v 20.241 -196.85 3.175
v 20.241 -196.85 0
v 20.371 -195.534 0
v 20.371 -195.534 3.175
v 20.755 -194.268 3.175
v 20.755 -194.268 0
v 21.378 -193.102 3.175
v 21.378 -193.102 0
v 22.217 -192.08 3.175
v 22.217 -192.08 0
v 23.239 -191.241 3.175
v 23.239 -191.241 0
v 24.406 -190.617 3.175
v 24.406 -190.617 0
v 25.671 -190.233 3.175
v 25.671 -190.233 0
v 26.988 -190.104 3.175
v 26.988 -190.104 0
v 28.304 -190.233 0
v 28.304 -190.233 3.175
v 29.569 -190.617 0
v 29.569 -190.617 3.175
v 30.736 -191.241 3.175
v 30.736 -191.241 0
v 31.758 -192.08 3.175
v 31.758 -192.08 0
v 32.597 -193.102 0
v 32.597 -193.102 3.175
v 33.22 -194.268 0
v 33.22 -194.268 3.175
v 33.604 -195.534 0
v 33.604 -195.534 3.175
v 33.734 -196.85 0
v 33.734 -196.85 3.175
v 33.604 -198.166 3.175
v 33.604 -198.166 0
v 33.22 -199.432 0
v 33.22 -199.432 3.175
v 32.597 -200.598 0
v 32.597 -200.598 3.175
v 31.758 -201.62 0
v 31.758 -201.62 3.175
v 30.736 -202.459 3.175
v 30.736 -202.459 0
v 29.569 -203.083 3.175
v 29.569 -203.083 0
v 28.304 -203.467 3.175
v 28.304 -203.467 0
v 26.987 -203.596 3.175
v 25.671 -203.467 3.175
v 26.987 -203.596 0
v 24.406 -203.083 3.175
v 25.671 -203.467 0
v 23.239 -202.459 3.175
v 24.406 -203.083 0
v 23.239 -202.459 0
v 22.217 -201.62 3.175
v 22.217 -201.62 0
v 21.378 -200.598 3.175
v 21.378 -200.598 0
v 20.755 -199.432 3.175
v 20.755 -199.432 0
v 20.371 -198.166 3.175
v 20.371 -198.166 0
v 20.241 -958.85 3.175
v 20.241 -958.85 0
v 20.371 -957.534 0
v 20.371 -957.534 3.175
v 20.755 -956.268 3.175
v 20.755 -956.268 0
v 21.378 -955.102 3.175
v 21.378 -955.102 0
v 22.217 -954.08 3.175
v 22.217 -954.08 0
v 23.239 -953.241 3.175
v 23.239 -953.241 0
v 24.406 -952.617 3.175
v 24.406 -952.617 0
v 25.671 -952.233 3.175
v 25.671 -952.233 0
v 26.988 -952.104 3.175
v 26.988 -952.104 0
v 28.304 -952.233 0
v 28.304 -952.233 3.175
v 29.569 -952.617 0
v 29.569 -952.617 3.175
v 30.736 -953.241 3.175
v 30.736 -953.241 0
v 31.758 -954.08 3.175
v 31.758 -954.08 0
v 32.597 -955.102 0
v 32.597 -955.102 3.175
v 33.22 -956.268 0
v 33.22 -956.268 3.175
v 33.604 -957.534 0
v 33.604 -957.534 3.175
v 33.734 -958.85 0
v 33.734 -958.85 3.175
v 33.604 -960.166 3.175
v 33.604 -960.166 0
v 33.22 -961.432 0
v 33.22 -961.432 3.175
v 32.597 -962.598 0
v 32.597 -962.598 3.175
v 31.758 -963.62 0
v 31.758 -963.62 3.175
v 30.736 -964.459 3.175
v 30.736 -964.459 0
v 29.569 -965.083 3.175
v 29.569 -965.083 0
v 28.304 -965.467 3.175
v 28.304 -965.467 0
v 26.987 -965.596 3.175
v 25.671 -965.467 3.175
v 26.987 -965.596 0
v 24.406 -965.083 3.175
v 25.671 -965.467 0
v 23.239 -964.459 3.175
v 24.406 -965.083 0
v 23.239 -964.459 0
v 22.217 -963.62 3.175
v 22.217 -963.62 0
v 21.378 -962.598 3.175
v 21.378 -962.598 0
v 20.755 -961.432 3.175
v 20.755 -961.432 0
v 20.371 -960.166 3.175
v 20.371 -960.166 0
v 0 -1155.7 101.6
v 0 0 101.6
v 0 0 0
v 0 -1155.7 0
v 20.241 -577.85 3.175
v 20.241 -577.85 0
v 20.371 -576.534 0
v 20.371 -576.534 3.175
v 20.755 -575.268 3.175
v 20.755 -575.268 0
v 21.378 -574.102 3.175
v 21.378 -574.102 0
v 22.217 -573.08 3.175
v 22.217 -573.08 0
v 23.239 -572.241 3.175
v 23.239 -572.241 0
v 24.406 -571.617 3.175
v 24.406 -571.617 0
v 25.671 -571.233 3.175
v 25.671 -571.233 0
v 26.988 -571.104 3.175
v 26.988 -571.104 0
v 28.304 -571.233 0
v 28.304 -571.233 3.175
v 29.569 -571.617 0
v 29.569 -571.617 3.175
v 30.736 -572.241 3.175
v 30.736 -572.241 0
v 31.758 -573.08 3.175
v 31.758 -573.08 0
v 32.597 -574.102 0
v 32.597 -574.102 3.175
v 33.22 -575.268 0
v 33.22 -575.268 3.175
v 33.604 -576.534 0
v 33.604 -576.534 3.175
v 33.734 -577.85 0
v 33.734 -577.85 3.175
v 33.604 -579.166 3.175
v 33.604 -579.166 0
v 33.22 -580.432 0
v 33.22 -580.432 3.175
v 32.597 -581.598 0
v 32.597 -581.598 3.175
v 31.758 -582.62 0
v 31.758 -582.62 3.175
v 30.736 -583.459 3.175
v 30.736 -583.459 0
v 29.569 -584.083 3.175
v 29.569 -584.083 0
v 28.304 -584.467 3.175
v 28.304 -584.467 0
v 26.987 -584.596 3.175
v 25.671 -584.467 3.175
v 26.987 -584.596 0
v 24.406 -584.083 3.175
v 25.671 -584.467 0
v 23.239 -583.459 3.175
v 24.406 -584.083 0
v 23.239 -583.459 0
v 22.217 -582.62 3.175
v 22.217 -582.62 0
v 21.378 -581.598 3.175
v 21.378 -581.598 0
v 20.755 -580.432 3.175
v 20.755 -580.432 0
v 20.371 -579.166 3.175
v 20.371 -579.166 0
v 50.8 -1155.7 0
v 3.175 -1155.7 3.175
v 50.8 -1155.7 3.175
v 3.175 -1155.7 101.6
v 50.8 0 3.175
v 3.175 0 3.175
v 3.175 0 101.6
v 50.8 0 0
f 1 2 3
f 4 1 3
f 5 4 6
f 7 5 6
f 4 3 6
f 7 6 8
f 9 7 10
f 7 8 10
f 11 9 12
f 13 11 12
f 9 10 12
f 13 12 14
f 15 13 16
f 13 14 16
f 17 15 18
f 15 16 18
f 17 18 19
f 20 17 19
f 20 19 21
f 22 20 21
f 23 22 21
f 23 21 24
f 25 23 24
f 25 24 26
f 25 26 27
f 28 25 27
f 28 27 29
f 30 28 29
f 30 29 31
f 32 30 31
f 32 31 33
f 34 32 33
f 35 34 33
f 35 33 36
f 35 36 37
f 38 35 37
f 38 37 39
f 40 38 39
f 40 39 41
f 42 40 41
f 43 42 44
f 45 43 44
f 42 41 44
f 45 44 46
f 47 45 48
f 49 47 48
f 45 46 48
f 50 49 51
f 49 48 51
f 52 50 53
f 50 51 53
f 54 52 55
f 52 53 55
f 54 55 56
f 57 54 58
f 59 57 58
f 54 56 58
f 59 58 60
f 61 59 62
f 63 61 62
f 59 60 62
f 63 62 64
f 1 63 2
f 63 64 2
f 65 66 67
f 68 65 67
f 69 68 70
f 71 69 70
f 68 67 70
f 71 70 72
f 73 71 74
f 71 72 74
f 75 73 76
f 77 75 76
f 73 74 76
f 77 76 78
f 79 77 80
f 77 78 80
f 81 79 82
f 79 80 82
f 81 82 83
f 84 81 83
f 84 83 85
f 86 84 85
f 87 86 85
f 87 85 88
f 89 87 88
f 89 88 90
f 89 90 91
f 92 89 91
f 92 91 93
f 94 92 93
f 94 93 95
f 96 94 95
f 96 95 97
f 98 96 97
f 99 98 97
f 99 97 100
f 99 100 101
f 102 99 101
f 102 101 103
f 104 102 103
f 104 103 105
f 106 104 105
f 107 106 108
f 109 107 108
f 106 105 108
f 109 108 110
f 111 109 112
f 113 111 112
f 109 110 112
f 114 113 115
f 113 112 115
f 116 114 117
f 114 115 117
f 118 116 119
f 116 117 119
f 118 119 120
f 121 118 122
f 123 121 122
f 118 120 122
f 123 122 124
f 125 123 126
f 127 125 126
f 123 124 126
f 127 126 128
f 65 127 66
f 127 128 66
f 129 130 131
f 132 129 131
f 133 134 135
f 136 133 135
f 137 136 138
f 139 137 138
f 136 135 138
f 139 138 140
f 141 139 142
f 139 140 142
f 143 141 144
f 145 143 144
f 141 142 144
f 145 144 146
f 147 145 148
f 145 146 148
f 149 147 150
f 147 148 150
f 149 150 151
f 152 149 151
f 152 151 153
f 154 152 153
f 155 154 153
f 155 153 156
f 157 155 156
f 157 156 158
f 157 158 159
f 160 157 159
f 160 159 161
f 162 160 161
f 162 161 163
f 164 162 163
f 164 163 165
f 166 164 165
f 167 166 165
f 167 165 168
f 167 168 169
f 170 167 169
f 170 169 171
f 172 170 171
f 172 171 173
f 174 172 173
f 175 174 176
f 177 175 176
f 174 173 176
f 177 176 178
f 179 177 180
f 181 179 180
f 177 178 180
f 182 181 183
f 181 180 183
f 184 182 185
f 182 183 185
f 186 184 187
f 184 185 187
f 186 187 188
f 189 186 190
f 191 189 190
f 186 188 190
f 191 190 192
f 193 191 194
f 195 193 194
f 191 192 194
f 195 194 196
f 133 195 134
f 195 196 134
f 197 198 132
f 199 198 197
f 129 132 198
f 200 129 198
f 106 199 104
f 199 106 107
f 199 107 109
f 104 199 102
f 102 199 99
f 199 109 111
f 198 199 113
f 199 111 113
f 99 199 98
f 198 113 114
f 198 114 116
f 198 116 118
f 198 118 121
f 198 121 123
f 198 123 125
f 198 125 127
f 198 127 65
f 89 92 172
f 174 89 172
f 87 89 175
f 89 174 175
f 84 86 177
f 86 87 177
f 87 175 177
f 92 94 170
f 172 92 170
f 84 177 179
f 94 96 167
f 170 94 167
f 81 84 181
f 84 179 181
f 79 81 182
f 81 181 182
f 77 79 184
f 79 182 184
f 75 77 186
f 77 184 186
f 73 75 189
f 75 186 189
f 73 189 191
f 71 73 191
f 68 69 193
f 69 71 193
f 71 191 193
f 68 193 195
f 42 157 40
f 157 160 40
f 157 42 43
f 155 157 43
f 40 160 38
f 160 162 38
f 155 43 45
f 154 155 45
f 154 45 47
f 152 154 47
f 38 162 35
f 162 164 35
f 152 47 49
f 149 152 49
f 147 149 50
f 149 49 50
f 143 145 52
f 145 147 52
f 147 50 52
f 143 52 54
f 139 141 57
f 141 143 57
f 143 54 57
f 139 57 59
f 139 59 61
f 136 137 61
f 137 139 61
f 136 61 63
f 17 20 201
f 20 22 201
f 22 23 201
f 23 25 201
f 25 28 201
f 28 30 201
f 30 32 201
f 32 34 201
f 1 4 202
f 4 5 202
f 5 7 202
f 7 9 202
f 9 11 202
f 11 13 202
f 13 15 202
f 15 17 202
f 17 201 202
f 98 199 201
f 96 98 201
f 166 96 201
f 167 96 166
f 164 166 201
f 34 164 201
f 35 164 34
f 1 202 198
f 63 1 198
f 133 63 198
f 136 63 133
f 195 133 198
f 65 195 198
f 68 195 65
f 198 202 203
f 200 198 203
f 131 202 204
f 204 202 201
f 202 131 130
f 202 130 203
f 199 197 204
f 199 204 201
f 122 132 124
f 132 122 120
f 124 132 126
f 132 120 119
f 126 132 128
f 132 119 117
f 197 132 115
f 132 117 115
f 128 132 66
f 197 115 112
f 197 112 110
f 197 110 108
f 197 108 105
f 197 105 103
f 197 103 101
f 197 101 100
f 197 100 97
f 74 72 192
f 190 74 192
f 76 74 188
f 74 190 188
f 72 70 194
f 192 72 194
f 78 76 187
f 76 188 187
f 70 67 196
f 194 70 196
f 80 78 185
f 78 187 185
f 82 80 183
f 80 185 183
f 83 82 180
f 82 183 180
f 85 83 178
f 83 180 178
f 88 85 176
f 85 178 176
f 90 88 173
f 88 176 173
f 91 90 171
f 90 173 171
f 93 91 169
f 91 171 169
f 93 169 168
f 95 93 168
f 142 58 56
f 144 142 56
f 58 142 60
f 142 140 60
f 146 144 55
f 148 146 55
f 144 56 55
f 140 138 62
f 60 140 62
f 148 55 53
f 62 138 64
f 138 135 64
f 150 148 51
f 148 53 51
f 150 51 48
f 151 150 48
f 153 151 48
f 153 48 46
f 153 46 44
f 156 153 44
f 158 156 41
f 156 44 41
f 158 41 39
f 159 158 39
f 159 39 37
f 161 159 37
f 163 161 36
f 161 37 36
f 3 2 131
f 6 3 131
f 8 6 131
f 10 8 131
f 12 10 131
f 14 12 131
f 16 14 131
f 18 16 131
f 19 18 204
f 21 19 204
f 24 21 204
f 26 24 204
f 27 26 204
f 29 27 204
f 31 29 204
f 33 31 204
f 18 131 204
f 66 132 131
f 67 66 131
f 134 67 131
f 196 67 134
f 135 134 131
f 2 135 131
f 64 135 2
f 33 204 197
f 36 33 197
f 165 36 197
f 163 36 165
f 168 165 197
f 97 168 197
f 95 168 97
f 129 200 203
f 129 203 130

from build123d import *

# Parameters (mm, degrees)
F1_DEPTH = 1155.7
F3_D     = 13.49248


with BuildPart() as f1:
    # F0 (on Front) → F1 (new body)
    with BuildSketch(Plane.XZ):
        Polygon((0, 101.6), (0, 0), (50.8, 0), (50.8, 3.175), (3.175, 3.175), (3.175, 101.6), align=None)
    extrude(amount=F1_DEPTH)

    # F3 (through all)
    with Locations(Plane.XY.offset(3.175)):
        with Locations((26.9875, -577.85), (26.9875, -196.85), (26.9875, -958.85)):
            Hole(F3_D / 2)


solid = f1.part
